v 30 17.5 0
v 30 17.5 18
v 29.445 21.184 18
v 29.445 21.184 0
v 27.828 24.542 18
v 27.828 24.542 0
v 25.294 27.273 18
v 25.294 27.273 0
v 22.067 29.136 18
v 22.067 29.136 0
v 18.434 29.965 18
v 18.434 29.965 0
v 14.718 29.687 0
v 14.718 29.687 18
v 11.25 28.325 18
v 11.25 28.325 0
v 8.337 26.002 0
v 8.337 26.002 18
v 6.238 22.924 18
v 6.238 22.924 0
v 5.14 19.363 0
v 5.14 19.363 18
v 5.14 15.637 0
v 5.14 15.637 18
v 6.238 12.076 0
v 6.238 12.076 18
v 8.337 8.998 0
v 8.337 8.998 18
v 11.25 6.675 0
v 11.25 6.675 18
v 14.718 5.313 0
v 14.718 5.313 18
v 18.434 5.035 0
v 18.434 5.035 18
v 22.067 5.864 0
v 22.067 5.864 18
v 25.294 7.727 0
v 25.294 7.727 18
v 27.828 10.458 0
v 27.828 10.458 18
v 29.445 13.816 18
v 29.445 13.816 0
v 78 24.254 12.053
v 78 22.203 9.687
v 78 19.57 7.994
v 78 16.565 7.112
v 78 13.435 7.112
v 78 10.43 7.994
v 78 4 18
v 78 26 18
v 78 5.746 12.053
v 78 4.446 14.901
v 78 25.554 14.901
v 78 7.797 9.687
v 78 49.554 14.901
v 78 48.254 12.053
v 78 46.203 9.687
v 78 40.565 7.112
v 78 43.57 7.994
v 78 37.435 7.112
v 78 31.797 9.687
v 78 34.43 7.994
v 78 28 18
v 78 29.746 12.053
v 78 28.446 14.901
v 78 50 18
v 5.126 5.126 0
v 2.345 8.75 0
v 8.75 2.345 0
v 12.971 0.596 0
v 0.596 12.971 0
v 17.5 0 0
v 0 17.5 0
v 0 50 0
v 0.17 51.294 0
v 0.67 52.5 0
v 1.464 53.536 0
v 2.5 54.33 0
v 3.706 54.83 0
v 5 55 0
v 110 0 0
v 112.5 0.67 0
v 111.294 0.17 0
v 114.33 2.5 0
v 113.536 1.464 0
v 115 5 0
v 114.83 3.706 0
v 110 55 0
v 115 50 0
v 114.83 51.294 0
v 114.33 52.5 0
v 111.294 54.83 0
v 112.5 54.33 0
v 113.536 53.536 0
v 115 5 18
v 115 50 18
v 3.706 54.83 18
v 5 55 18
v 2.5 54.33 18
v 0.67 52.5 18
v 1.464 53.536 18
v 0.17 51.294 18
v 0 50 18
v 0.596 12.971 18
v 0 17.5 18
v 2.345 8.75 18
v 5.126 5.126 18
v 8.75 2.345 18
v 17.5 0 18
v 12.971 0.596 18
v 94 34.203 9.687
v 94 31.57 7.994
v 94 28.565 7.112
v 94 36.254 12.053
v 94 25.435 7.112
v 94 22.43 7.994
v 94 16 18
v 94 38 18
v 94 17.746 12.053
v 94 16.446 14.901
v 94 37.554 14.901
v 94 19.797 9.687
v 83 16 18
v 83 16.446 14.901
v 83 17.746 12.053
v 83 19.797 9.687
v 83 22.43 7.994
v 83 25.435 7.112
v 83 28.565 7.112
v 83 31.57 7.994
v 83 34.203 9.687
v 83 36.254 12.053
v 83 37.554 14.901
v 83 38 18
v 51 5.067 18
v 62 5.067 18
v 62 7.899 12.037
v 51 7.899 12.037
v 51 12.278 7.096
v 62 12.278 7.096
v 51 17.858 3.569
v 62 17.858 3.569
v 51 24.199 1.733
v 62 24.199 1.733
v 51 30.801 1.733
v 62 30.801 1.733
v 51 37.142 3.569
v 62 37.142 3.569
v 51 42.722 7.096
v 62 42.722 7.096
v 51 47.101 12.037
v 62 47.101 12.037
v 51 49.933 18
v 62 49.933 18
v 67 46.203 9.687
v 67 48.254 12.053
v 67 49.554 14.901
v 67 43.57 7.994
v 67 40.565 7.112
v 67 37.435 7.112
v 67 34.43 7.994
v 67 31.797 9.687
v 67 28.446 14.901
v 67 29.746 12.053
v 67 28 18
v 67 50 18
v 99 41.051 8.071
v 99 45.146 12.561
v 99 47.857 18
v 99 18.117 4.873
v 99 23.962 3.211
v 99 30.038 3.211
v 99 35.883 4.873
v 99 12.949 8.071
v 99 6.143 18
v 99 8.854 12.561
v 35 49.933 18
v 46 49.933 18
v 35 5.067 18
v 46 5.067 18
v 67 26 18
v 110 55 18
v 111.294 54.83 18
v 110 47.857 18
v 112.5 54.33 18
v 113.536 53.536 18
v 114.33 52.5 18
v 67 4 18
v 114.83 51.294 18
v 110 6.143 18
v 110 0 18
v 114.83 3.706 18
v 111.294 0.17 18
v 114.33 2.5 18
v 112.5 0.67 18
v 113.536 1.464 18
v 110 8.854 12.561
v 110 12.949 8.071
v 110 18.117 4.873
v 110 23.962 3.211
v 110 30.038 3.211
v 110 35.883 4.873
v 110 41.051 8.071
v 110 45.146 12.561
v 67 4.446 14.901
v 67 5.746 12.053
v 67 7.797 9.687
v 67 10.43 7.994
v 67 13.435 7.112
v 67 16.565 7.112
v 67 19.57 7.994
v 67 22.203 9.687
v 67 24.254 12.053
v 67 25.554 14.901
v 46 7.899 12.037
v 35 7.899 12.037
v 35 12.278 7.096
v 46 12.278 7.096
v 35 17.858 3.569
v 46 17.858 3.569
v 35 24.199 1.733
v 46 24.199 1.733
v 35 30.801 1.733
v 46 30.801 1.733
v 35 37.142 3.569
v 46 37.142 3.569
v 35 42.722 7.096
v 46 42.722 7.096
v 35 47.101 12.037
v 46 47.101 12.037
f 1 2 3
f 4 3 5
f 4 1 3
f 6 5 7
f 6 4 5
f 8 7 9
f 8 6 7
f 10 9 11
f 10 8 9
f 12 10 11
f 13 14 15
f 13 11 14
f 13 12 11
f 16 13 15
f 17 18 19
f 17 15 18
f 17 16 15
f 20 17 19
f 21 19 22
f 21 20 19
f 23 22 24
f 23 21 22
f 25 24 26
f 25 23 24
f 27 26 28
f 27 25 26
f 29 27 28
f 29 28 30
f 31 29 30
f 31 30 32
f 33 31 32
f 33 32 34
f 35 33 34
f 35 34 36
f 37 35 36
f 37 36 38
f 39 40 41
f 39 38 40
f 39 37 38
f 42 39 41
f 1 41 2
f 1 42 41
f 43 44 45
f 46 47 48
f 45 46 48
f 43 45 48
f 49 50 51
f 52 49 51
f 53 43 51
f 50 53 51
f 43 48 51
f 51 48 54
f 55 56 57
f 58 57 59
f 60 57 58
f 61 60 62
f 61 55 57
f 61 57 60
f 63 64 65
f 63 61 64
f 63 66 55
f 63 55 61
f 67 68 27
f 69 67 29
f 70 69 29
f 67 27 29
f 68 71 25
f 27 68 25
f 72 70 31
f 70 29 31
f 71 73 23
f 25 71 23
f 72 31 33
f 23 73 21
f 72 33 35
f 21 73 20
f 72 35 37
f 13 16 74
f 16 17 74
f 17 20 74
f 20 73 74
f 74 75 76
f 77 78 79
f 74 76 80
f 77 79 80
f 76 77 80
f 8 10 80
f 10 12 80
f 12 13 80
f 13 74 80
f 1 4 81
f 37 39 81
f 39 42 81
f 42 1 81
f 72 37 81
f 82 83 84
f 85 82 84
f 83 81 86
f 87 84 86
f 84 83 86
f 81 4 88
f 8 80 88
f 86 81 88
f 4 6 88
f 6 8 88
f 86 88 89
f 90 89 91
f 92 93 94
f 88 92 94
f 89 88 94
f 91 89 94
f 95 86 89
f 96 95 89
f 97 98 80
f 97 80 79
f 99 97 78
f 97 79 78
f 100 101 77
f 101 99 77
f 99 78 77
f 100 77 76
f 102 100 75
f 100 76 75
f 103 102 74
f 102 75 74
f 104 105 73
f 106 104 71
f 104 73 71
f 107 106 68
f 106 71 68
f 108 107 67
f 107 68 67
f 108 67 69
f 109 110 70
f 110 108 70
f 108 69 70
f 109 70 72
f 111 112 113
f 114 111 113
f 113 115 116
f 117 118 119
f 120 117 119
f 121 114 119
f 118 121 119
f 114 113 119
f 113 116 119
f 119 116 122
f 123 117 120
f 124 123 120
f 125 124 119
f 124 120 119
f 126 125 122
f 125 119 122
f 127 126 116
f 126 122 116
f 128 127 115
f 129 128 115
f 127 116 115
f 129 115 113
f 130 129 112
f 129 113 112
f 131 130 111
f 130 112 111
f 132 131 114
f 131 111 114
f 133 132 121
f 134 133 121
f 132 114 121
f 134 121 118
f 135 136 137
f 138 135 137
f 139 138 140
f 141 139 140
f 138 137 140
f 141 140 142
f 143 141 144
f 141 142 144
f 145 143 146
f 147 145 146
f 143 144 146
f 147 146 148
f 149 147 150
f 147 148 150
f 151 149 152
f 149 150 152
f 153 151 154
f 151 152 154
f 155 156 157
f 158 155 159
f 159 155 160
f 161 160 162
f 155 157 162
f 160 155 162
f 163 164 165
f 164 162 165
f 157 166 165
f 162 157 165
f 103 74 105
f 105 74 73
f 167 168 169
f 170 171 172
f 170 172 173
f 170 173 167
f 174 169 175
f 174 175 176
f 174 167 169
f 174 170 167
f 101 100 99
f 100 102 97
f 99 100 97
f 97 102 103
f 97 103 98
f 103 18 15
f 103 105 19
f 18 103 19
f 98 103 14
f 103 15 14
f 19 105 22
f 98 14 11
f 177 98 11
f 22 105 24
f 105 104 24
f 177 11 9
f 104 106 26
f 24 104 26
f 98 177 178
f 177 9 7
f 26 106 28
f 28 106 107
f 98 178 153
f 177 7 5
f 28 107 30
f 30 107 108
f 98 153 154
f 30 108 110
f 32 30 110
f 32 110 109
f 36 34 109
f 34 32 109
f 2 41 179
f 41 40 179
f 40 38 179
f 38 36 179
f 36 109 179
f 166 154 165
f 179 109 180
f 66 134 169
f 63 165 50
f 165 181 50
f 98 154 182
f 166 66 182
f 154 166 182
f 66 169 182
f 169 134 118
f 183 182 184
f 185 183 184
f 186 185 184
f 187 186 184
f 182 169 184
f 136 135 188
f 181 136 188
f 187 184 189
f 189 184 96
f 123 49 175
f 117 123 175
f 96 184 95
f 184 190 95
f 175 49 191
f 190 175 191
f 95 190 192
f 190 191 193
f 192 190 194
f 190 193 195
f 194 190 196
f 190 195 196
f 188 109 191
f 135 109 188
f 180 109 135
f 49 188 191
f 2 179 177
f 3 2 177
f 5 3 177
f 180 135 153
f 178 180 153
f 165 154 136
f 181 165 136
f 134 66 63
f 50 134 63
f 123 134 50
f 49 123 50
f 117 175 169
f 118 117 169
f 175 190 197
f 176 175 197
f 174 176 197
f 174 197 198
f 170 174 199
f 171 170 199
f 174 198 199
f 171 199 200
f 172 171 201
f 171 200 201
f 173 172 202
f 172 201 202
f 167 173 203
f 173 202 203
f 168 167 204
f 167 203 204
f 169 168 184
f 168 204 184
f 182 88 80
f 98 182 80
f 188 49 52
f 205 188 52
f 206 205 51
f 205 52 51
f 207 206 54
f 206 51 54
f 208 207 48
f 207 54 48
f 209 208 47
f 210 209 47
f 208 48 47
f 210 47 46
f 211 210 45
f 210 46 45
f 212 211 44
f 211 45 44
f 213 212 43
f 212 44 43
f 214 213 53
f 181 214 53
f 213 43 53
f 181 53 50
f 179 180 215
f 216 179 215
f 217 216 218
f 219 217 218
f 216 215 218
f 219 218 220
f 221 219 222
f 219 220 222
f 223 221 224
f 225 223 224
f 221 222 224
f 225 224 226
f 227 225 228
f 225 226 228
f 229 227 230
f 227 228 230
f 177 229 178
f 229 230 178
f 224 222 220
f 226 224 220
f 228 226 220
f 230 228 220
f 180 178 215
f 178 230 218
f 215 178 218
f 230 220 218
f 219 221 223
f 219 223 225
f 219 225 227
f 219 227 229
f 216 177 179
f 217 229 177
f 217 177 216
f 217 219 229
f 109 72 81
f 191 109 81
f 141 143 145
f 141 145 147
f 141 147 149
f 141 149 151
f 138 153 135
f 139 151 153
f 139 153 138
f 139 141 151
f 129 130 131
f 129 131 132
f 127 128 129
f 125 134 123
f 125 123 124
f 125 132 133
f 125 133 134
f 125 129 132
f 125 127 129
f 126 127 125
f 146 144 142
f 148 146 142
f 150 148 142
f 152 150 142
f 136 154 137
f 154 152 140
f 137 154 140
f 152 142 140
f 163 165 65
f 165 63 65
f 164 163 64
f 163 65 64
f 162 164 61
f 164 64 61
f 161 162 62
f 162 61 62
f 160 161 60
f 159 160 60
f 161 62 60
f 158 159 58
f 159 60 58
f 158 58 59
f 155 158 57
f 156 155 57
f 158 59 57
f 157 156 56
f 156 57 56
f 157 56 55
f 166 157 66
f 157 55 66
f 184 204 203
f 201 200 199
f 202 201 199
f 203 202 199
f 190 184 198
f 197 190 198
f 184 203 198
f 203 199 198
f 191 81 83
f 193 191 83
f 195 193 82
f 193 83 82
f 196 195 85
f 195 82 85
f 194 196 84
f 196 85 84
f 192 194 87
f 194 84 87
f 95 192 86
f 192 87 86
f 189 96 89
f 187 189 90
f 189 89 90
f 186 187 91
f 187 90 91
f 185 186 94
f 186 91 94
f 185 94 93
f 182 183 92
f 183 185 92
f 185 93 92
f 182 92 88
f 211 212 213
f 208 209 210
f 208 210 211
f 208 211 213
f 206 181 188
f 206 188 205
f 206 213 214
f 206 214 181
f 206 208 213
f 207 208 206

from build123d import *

# Parameters (mm, degrees)
F0_R     = 12.5
F1_DEPTH = 25
F2_W     = 11
F2_H     = 23.5
F4_W     = 147.382453084
F4_H     = 22.0085635483
F5_DEPTH = 55.001
F6_W     = 11
F6_H     = 11
F11_W    = 11
F11_H    = 22


with BuildPart() as f1:
    # F0 (on Top) → F1 (new body)
    with BuildSketch(Plane.XY):
        with BuildLine():
            ThreePointArc((0, 17.5), (5.1256313292, 5.1256313292), (17.5, 0))
            Line((17.5, 0), (110, 0))
            ThreePointArc((110, 0), (113.5355339059, 1.4644660941), (115, 5))
            Line((115, 5), (115, 50))
            ThreePointArc((115, 50), (113.5355339059, 53.5355339059), (110, 55))
            Line((110, 55), (5, 55))
            ThreePointArc((5, 55), (1.4644660941, 53.5355339059), (0, 50))
            Line((0, 50), (0, 17.5))
        make_face()
        with Locations((17.5, 17.5)):
            Circle(F0_R, mode=Mode.SUBTRACT)
    extrude(amount=F1_DEPTH)

    # F2 (on face) → F3 (revolve, cut)
    with BuildSketch(Plane.XY.offset(25)):
        with Locations((40.5, 15.75)):
            Rectangle(F2_W, F2_H)
        with Locations((56.5, 15.75)):
            Rectangle(F2_W, F2_H)
    revolve(axis=Axis((40.5, 27.5, 25), (1, 0, 0)), mode=Mode.SUBTRACT)

    # F4 (on face) → F5 (cut, through all)
    with BuildSketch(Plane.XZ):
        with Locations((73.691226542, 29.0042817742)):
            Rectangle(F4_W, F4_H)
    extrude(amount=-F5_DEPTH, mode=Mode.SUBTRACT)

    # F6 (on face) → F7 (revolve, cut)
    with BuildSketch(Plane.XY.offset(18)):
        with Locations((72.5, 9.5)):
            Rectangle(F6_W, F6_H)
    revolve(axis=Axis((72.5, 15, 18), (1, 0, 0)), mode=Mode.SUBTRACT)

    # F6 (on face) → F8 (revolve, cut)
    with BuildSketch(Plane.XY.offset(18)):
        with Locations((88.5, 21.5)):
            Rectangle(F6_W, F6_H)
    revolve(axis=Axis((88.5, 27, 18), (1, 0, 0)), mode=Mode.SUBTRACT)

    # F6 (on face) → F9 (revolve, cut)
    with BuildSketch(Plane.XY.offset(18)):
        with Locations((72.5, 44.5)):
            Rectangle(F6_W, F6_H)
    revolve(axis=Axis((72.5, 39, 18), (1, 0, 0)), mode=Mode.SUBTRACT)

    # F11 (on offset) → F12 (revolve, cut)
    with BuildSketch(Plane.XY.offset(25)):
        with Locations((104.5, 16)):
            Rectangle(F11_W, F11_H)
    revolve(axis=Axis((104.5, 27, 25), (1, 0, 0)), mode=Mode.SUBTRACT)


solid = f1.part
